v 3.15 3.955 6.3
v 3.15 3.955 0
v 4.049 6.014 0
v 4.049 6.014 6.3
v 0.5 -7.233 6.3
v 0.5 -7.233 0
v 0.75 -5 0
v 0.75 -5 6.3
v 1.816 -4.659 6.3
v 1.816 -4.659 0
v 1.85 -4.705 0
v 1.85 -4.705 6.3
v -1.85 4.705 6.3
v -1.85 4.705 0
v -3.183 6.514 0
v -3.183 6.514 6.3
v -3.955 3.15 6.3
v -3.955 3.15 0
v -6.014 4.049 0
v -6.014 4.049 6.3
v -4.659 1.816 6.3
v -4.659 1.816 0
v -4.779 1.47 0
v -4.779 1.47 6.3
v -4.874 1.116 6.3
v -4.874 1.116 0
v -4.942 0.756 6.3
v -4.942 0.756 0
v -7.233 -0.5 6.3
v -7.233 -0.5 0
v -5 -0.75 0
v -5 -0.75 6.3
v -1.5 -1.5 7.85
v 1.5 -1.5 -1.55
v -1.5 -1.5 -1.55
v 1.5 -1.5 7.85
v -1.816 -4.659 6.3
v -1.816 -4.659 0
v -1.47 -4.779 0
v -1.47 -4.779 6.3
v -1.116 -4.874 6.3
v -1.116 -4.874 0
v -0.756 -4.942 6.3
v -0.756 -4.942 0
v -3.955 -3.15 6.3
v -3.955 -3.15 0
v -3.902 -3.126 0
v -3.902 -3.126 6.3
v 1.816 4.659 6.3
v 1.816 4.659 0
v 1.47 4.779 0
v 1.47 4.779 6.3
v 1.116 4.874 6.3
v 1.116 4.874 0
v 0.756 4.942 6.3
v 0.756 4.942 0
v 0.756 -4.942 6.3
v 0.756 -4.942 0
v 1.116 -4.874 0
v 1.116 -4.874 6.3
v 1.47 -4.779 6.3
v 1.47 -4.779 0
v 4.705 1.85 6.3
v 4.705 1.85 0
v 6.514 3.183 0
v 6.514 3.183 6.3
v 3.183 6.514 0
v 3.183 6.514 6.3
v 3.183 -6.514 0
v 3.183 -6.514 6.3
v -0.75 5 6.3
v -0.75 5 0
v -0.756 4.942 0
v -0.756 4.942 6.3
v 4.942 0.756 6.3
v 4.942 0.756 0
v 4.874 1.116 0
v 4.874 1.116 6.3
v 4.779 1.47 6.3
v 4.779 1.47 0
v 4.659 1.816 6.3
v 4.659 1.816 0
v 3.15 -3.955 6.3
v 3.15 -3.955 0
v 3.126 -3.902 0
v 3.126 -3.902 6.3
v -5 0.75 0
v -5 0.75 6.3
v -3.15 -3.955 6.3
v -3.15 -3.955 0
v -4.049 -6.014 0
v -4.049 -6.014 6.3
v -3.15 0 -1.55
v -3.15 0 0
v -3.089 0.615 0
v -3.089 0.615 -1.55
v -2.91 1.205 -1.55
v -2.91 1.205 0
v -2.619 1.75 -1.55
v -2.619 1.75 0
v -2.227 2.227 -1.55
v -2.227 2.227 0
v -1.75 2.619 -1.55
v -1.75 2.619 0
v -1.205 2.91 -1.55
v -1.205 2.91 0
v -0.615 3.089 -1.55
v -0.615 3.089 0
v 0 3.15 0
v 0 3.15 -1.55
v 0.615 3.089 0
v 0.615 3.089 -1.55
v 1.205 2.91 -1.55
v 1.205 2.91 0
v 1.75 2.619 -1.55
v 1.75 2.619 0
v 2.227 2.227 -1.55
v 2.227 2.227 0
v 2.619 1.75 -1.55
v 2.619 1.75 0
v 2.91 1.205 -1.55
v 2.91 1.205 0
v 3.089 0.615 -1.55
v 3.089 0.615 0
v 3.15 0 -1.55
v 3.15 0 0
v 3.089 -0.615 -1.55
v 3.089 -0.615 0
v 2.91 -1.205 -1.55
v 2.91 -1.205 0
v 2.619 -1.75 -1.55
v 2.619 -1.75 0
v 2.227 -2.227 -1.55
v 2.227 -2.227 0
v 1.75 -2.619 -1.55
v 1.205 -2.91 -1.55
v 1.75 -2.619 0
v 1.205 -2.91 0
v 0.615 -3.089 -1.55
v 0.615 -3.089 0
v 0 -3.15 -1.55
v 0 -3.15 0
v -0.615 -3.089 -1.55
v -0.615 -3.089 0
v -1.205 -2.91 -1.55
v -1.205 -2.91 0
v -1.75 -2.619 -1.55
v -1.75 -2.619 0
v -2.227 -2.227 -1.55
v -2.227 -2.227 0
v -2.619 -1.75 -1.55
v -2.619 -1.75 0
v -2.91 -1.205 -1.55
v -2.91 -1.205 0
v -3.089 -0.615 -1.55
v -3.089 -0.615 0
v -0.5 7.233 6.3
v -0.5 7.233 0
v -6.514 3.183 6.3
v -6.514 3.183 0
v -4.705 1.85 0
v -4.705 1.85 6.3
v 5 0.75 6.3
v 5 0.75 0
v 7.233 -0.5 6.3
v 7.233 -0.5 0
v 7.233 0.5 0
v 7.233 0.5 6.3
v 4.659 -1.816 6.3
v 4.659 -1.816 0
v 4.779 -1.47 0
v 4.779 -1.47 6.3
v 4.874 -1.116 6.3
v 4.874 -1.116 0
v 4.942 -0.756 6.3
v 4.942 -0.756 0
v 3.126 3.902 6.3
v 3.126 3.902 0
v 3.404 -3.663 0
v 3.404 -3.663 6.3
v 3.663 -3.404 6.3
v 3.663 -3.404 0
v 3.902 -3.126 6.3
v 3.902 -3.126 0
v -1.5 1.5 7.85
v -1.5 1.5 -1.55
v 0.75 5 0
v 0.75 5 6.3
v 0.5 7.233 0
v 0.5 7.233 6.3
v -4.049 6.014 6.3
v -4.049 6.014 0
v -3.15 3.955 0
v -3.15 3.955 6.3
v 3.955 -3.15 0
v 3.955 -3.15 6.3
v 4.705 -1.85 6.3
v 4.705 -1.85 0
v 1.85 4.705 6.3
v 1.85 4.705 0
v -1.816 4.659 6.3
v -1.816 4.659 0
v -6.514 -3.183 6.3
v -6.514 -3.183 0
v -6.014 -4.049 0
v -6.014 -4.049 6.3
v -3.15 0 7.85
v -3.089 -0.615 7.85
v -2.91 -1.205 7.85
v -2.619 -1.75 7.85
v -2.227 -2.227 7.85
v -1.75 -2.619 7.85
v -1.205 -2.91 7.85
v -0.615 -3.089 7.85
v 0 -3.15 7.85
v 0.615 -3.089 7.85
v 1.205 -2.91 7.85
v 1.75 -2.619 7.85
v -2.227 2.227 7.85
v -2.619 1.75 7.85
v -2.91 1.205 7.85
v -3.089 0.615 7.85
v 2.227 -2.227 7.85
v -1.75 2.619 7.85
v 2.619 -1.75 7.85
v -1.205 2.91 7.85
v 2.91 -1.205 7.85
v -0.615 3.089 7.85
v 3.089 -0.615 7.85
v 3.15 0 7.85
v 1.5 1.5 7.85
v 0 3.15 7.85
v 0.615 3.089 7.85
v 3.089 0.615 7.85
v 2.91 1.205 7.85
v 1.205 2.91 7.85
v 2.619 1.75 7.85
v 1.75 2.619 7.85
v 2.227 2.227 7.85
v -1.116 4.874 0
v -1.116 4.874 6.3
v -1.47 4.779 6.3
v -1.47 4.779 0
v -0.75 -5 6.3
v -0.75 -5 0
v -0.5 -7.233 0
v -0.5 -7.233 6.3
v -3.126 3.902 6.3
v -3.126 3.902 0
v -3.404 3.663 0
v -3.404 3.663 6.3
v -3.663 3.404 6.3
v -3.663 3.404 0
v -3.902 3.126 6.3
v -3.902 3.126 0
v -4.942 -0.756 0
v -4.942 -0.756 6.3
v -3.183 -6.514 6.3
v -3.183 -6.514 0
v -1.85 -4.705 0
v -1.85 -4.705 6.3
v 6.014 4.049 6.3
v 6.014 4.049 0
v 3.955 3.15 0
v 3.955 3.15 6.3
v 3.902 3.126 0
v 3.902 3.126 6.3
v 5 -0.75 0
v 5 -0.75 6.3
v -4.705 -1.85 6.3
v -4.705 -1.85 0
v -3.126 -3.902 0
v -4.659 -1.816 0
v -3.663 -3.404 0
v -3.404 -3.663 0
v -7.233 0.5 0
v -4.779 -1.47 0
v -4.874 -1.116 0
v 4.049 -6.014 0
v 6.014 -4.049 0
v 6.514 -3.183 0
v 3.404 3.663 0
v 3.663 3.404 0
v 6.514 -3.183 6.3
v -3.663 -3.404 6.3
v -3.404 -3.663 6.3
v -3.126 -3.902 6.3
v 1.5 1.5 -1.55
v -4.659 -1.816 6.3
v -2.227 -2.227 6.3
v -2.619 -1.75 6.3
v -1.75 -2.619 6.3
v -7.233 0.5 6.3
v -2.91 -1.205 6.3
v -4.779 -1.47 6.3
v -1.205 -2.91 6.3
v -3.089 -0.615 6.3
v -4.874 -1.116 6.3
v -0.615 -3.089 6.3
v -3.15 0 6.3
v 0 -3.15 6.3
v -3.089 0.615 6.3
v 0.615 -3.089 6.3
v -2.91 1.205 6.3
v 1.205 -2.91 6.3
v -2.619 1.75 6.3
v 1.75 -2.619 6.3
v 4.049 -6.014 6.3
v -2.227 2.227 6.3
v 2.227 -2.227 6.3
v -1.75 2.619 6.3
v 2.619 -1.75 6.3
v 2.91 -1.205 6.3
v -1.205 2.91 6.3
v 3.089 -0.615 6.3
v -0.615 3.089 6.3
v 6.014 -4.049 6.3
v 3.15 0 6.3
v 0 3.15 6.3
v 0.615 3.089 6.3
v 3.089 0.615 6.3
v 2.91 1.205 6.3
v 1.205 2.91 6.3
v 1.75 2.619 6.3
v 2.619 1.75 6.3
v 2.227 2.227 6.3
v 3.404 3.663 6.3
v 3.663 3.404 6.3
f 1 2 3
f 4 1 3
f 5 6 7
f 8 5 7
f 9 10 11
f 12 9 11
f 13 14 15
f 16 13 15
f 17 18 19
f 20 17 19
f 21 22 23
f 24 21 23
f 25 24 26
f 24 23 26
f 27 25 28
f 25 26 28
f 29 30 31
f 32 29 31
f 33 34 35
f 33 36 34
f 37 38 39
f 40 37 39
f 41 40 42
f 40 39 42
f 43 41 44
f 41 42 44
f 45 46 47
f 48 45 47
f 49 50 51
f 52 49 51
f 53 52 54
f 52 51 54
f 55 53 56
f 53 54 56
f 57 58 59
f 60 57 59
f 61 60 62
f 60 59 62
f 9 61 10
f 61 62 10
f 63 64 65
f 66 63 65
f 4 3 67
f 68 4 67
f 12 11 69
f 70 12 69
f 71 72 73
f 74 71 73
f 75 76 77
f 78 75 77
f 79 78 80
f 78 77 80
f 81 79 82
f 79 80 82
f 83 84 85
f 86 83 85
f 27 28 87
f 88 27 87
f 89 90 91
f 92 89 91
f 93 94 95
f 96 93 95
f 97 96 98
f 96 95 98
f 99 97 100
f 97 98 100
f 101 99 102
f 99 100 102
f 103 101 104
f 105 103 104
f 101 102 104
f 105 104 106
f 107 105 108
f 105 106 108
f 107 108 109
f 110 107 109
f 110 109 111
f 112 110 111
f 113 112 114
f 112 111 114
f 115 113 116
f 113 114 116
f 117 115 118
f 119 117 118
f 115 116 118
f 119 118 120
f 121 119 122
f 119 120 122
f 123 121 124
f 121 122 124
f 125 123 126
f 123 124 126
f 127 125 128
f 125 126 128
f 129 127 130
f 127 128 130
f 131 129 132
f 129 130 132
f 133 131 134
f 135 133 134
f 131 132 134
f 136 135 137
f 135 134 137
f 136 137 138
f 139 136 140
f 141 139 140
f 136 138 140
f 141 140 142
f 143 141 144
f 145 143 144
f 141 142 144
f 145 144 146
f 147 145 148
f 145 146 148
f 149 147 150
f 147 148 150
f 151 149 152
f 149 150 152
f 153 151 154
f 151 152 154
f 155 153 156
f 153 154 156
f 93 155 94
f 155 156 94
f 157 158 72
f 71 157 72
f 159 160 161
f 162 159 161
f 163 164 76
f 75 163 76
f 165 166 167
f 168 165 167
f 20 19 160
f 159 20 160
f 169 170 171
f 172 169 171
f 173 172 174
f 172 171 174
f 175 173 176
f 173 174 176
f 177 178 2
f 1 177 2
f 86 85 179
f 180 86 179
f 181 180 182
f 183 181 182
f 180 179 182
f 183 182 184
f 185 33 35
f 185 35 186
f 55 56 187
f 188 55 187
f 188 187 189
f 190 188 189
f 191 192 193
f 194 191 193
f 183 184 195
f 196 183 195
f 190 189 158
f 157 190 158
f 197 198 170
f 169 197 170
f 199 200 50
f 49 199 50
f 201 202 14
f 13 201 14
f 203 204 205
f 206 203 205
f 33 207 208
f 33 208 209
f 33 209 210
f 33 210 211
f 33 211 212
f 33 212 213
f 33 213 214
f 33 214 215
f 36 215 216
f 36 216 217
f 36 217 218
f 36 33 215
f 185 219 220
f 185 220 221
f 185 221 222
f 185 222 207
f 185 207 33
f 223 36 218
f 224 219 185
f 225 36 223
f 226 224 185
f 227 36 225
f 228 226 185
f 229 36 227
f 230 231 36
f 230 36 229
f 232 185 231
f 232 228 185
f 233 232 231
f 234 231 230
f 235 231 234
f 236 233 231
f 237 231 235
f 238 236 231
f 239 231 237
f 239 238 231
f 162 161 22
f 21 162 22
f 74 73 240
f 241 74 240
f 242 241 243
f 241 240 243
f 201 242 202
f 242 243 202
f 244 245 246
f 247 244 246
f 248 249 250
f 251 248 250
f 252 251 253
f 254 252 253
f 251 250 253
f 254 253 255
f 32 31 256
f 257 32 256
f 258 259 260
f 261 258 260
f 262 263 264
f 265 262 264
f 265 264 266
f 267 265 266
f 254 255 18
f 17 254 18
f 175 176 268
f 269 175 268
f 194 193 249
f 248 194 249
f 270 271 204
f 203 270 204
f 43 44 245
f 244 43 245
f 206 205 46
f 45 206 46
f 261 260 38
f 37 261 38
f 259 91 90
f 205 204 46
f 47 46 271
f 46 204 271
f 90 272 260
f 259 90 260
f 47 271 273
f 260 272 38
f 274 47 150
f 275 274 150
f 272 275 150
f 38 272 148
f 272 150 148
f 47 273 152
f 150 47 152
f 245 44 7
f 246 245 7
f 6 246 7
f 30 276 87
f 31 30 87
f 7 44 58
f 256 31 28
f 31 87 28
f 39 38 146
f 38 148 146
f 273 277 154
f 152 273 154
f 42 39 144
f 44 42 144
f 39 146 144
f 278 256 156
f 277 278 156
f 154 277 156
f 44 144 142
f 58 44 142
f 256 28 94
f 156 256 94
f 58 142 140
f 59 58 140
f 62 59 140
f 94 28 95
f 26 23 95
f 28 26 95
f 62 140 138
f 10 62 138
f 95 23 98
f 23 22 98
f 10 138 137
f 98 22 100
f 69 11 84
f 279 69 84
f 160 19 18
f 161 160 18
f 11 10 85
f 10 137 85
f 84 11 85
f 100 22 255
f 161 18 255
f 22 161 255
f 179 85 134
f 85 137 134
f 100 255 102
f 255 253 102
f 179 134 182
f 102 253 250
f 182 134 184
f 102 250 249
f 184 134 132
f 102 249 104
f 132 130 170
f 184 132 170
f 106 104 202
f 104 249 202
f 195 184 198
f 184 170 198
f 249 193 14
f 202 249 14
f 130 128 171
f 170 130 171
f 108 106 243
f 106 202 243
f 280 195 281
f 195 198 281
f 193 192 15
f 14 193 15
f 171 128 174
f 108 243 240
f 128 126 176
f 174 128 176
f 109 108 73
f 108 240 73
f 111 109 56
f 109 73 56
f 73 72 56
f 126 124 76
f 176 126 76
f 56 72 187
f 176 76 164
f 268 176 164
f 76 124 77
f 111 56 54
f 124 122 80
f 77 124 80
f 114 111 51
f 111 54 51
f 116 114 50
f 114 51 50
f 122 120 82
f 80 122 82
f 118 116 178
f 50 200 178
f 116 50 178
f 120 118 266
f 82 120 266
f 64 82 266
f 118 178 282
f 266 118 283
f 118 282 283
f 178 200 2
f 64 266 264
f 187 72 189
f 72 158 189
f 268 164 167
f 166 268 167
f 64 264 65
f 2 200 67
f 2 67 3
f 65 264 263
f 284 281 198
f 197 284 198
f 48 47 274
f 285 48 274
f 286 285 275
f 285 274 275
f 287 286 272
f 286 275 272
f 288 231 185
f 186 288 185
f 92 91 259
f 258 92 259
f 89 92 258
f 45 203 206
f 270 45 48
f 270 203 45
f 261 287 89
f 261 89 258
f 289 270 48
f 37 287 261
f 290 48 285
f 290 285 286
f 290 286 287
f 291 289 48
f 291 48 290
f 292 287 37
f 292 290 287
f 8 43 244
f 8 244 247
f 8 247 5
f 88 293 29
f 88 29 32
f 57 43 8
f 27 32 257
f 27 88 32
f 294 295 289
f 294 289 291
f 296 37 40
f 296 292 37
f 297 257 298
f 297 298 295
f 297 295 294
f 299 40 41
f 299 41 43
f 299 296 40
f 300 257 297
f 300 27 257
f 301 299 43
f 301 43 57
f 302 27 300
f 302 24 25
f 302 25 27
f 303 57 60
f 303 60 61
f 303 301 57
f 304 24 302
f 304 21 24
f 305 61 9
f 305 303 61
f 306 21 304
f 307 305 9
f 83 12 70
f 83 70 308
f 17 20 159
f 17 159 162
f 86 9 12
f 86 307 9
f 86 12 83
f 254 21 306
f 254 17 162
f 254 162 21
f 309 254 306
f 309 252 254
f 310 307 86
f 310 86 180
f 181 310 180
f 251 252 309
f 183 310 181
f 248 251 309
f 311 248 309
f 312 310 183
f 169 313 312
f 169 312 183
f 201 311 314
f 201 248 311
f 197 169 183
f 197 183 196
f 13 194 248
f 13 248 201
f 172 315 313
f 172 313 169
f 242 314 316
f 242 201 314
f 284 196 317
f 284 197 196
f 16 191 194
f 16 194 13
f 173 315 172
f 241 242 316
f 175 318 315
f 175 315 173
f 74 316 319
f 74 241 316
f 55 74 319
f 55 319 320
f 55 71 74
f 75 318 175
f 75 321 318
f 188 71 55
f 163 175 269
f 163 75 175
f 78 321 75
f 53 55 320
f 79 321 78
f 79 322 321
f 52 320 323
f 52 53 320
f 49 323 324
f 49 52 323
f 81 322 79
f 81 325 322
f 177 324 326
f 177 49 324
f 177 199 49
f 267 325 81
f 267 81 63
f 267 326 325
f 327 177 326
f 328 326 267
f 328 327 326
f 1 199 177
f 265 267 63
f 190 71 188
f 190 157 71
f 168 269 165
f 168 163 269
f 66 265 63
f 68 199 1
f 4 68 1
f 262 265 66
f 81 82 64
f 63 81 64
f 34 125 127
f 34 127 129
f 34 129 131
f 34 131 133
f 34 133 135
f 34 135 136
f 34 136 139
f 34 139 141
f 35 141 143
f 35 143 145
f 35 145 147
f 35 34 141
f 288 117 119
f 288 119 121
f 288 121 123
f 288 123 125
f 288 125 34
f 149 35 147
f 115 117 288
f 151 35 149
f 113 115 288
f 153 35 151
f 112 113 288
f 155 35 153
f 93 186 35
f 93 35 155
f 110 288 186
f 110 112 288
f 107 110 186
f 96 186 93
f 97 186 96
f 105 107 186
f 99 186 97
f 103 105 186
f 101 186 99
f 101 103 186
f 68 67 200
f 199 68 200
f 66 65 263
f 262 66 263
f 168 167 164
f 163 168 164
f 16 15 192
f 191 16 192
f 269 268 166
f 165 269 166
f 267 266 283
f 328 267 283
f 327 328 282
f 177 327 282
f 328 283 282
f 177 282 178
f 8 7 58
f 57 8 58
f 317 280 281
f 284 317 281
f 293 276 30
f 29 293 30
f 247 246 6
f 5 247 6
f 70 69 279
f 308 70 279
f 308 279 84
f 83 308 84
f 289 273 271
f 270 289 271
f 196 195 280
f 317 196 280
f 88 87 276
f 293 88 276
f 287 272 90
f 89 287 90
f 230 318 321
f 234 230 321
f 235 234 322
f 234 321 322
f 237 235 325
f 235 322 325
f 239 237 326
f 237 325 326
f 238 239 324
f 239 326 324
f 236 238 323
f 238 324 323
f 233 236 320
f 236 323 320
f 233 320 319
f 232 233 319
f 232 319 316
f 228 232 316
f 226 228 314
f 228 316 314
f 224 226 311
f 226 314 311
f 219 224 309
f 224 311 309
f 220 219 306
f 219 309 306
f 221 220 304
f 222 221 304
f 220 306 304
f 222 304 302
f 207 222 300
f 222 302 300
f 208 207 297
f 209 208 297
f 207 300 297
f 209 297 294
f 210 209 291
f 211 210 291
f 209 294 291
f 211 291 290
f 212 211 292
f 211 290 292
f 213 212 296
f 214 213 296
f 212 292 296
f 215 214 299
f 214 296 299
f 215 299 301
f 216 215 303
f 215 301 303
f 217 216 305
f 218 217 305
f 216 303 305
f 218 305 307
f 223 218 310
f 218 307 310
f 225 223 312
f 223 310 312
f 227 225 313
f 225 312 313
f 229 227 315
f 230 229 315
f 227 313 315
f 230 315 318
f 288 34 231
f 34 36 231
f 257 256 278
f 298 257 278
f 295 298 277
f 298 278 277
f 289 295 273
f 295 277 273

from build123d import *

# Parameters (mm, degrees)
SKETCH1_R           = 5
SKETCH1_W           = 3
SKETCH1_H           = 3
BOSS_EXTRUDE1_DEPTH = 6.3
SKETCH2_R           = 3.15
SKETCH2_W           = 3
SKETCH2_H           = 3
BOSS_EXTRUDE2_DEPTH = 1.55
SKETCH3_R           = 3.15
SKETCH3_W           = 3
SKETCH3_H           = 3
BOSS_EXTRUDE3_DEPTH = 1.55


with BuildPart() as part:
    # Sketch1 → Boss-Extrude1 (new body)
    with BuildSketch(Plane.XY):
        Circle(SKETCH1_R)
        Rectangle(SKETCH1_W, SKETCH1_H, mode=Mode.SUBTRACT)
        with BuildLine():
            ThreePointArc((-4.942448008, -0.756444105), (-5, 0), (-4.942448008, 0.756444105))
            Line((-4.942448008, 0.756444105), (-5, 0.75))
            Line((-5, 0.75), (-7.232738071, 0.5))
            Line((-7.232738071, 0.5), (-7.232738071, -0.5))
            Line((-7.232738071, -0.5), (-5, -0.75))
            Line((-5, -0.75), (-4.942448008, -0.756444105))
        make_face()
        with BuildLine():
            ThreePointArc((-4.658507585, 1.816124193), (-4.330127019, 2.5), (-3.90206348, 3.126323815))
            Line((-3.90206348, 3.126323815), (-3.955127019, 3.149519053))
            Line((-3.955127019, 3.149519053), (-6.013734908, 4.049381737))
            Line((-6.013734908, 4.049381737), (-6.513734908, 3.183356333))
            Line((-6.513734908, 3.183356333), (-4.705127019, 1.850480947))
            Line((-4.705127019, 1.850480947), (-4.658507585, 1.816124193))
        make_face()
        with BuildLine():
            ThreePointArc((-3.126323815, 3.90206348), (-2.5, 4.330127019), (-1.816124193, 4.658507585))
            Line((-1.816124193, 4.658507585), (-1.850480947, 4.705127019))
            Line((-1.850480947, 4.705127019), (-3.183356333, 6.513734908))
            Line((-3.183356333, 6.513734908), (-4.049381737, 6.013734908))
            Line((-4.049381737, 6.013734908), (-3.149519053, 3.955127019))
            Line((-3.149519053, 3.955127019), (-3.126323815, 3.90206348))
        make_face()
        with BuildLine():
            Line((0.5, 7.232738071), (-0.5, 7.232738071))
            Line((-0.5, 7.232738071), (-0.75, 5))
            Line((-0.75, 5), (-0.756444105, 4.942448008))
            ThreePointArc((-0.756444105, 4.942448008), (0, 5), (0.756444105, 4.942448008))
            Line((0.756444105, 4.942448008), (0.75, 5))
            Line((0.75, 5), (0.5, 7.232738071))
        make_face()
        with BuildLine():
            Line((1.850480947, 4.705127019), (1.816124193, 4.658507585))
            ThreePointArc((1.816124193, 4.658507585), (2.5, 4.330127019), (3.126323815, 3.90206348))
            Line((3.126323815, 3.90206348), (3.149519053, 3.955127019))
            Line((3.149519053, 3.955127019), (4.049381737, 6.013734908))
            Line((4.049381737, 6.013734908), (3.183356333, 6.513734908))
            Line((3.183356333, 6.513734908), (1.850480947, 4.705127019))
        make_face()
        with BuildLine():
            Line((3.955127019, 3.149519053), (3.90206348, 3.126323815))
            ThreePointArc((3.90206348, 3.126323815), (4.330127019, 2.5), (4.658507585, 1.816124193))
            Line((4.658507585, 1.816124193), (4.705127019, 1.850480947))
            Line((4.705127019, 1.850480947), (6.513734908, 3.183356333))
            Line((6.513734908, 3.183356333), (6.013734908, 4.049381737))
            Line((6.013734908, 4.049381737), (3.955127019, 3.149519053))
        make_face()
        with BuildLine():
            Line((5, 0.75), (4.942448008, 0.756444105))
            ThreePointArc((4.942448008, 0.756444105), (4.985591241, 0.379315144), (5, 0))
            ThreePointArc((5, 0), (4.985591241, -0.379315144), (4.942448008, -0.756444105))
            Line((4.942448008, -0.756444105), (5, -0.75))
            Line((5, -0.75), (7.232738071, -0.5))
            Line((7.232738071, -0.5), (7.232738071, 0.5))
            Line((7.232738071, 0.5), (5, 0.75))
        make_face()
        with BuildLine():
            Line((4.705127019, -1.850480947), (4.658507585, -1.816124193))
            ThreePointArc((4.658507585, -1.816124193), (4.330127019, -2.5), (3.90206348, -3.126323815))
            Line((3.90206348, -3.126323815), (3.955127019, -3.149519053))
            Line((3.955127019, -3.149519053), (6.013734908, -4.049381737))
            Line((6.013734908, -4.049381737), (6.513734908, -3.183356333))
            Line((6.513734908, -3.183356333), (4.705127019, -1.850480947))
        make_face()
        with BuildLine():
            Line((3.149519053, -3.955127019), (3.126323815, -3.90206348))
            ThreePointArc((3.126323815, -3.90206348), (2.5, -4.330127019), (1.816124193, -4.658507585))
            Line((1.816124193, -4.658507585), (1.850480947, -4.705127019))
            Line((1.850480947, -4.705127019), (3.183356333, -6.513734908))
            Line((3.183356333, -6.513734908), (4.049381737, -6.013734908))
            Line((4.049381737, -6.013734908), (3.149519053, -3.955127019))
        make_face()
        with BuildLine():
            ThreePointArc((0.756444105, -4.942448008), (0, -5), (-0.756444105, -4.942448008))
            Line((-0.756444105, -4.942448008), (-0.75, -5))
            Line((-0.75, -5), (-0.5, -7.232738071))
            Line((-0.5, -7.232738071), (0.5, -7.232738071))
            Line((0.5, -7.232738071), (0.75, -5))
            Line((0.75, -5), (0.756444105, -4.942448008))
        make_face()
        with BuildLine():
            ThreePointArc((-1.816124193, -4.658507585), (-2.5, -4.330127019), (-3.126323815, -3.90206348))
            Line((-3.126323815, -3.90206348), (-3.149519053, -3.955127019))
            Line((-3.149519053, -3.955127019), (-4.049381737, -6.013734908))
            Line((-4.049381737, -6.013734908), (-3.183356333, -6.513734908))
            Line((-3.183356333, -6.513734908), (-1.850480947, -4.705127019))
            Line((-1.850480947, -4.705127019), (-1.816124193, -4.658507585))
        make_face()
        with BuildLine():
            ThreePointArc((-3.90206348, -3.126323815), (-4.330127019, -2.5), (-4.658507585, -1.816124193))
            Line((-4.658507585, -1.816124193), (-4.705127019, -1.850480947))
            Line((-4.705127019, -1.850480947), (-6.513734908, -3.183356333))
            Line((-6.513734908, -3.183356333), (-6.013734908, -4.049381737))
            Line((-6.013734908, -4.049381737), (-3.955127019, -3.149519053))
            Line((-3.955127019, -3.149519053), (-3.90206348, -3.126323815))
        make_face()
    extrude(amount=BOSS_EXTRUDE1_DEPTH)

    # Sketch2 → Boss-Extrude2 (add)
    with BuildSketch(Plane.XY.offset(6.3)):
        Circle(SKETCH2_R)
        Rectangle(SKETCH2_W, SKETCH2_H, mode=Mode.SUBTRACT)
    extrude(amount=BOSS_EXTRUDE2_DEPTH)

    # Sketch3 → Boss-Extrude3 (add)
    with BuildSketch(Plane(origin=(0, 0, 0), x_dir=(-1, 0, 0), z_dir=(0, 0, -1))):
        Circle(SKETCH3_R)
        Rectangle(SKETCH3_W, SKETCH3_H, mode=Mode.SUBTRACT)
    extrude(amount=BOSS_EXTRUDE3_DEPTH)


solid = part.part
